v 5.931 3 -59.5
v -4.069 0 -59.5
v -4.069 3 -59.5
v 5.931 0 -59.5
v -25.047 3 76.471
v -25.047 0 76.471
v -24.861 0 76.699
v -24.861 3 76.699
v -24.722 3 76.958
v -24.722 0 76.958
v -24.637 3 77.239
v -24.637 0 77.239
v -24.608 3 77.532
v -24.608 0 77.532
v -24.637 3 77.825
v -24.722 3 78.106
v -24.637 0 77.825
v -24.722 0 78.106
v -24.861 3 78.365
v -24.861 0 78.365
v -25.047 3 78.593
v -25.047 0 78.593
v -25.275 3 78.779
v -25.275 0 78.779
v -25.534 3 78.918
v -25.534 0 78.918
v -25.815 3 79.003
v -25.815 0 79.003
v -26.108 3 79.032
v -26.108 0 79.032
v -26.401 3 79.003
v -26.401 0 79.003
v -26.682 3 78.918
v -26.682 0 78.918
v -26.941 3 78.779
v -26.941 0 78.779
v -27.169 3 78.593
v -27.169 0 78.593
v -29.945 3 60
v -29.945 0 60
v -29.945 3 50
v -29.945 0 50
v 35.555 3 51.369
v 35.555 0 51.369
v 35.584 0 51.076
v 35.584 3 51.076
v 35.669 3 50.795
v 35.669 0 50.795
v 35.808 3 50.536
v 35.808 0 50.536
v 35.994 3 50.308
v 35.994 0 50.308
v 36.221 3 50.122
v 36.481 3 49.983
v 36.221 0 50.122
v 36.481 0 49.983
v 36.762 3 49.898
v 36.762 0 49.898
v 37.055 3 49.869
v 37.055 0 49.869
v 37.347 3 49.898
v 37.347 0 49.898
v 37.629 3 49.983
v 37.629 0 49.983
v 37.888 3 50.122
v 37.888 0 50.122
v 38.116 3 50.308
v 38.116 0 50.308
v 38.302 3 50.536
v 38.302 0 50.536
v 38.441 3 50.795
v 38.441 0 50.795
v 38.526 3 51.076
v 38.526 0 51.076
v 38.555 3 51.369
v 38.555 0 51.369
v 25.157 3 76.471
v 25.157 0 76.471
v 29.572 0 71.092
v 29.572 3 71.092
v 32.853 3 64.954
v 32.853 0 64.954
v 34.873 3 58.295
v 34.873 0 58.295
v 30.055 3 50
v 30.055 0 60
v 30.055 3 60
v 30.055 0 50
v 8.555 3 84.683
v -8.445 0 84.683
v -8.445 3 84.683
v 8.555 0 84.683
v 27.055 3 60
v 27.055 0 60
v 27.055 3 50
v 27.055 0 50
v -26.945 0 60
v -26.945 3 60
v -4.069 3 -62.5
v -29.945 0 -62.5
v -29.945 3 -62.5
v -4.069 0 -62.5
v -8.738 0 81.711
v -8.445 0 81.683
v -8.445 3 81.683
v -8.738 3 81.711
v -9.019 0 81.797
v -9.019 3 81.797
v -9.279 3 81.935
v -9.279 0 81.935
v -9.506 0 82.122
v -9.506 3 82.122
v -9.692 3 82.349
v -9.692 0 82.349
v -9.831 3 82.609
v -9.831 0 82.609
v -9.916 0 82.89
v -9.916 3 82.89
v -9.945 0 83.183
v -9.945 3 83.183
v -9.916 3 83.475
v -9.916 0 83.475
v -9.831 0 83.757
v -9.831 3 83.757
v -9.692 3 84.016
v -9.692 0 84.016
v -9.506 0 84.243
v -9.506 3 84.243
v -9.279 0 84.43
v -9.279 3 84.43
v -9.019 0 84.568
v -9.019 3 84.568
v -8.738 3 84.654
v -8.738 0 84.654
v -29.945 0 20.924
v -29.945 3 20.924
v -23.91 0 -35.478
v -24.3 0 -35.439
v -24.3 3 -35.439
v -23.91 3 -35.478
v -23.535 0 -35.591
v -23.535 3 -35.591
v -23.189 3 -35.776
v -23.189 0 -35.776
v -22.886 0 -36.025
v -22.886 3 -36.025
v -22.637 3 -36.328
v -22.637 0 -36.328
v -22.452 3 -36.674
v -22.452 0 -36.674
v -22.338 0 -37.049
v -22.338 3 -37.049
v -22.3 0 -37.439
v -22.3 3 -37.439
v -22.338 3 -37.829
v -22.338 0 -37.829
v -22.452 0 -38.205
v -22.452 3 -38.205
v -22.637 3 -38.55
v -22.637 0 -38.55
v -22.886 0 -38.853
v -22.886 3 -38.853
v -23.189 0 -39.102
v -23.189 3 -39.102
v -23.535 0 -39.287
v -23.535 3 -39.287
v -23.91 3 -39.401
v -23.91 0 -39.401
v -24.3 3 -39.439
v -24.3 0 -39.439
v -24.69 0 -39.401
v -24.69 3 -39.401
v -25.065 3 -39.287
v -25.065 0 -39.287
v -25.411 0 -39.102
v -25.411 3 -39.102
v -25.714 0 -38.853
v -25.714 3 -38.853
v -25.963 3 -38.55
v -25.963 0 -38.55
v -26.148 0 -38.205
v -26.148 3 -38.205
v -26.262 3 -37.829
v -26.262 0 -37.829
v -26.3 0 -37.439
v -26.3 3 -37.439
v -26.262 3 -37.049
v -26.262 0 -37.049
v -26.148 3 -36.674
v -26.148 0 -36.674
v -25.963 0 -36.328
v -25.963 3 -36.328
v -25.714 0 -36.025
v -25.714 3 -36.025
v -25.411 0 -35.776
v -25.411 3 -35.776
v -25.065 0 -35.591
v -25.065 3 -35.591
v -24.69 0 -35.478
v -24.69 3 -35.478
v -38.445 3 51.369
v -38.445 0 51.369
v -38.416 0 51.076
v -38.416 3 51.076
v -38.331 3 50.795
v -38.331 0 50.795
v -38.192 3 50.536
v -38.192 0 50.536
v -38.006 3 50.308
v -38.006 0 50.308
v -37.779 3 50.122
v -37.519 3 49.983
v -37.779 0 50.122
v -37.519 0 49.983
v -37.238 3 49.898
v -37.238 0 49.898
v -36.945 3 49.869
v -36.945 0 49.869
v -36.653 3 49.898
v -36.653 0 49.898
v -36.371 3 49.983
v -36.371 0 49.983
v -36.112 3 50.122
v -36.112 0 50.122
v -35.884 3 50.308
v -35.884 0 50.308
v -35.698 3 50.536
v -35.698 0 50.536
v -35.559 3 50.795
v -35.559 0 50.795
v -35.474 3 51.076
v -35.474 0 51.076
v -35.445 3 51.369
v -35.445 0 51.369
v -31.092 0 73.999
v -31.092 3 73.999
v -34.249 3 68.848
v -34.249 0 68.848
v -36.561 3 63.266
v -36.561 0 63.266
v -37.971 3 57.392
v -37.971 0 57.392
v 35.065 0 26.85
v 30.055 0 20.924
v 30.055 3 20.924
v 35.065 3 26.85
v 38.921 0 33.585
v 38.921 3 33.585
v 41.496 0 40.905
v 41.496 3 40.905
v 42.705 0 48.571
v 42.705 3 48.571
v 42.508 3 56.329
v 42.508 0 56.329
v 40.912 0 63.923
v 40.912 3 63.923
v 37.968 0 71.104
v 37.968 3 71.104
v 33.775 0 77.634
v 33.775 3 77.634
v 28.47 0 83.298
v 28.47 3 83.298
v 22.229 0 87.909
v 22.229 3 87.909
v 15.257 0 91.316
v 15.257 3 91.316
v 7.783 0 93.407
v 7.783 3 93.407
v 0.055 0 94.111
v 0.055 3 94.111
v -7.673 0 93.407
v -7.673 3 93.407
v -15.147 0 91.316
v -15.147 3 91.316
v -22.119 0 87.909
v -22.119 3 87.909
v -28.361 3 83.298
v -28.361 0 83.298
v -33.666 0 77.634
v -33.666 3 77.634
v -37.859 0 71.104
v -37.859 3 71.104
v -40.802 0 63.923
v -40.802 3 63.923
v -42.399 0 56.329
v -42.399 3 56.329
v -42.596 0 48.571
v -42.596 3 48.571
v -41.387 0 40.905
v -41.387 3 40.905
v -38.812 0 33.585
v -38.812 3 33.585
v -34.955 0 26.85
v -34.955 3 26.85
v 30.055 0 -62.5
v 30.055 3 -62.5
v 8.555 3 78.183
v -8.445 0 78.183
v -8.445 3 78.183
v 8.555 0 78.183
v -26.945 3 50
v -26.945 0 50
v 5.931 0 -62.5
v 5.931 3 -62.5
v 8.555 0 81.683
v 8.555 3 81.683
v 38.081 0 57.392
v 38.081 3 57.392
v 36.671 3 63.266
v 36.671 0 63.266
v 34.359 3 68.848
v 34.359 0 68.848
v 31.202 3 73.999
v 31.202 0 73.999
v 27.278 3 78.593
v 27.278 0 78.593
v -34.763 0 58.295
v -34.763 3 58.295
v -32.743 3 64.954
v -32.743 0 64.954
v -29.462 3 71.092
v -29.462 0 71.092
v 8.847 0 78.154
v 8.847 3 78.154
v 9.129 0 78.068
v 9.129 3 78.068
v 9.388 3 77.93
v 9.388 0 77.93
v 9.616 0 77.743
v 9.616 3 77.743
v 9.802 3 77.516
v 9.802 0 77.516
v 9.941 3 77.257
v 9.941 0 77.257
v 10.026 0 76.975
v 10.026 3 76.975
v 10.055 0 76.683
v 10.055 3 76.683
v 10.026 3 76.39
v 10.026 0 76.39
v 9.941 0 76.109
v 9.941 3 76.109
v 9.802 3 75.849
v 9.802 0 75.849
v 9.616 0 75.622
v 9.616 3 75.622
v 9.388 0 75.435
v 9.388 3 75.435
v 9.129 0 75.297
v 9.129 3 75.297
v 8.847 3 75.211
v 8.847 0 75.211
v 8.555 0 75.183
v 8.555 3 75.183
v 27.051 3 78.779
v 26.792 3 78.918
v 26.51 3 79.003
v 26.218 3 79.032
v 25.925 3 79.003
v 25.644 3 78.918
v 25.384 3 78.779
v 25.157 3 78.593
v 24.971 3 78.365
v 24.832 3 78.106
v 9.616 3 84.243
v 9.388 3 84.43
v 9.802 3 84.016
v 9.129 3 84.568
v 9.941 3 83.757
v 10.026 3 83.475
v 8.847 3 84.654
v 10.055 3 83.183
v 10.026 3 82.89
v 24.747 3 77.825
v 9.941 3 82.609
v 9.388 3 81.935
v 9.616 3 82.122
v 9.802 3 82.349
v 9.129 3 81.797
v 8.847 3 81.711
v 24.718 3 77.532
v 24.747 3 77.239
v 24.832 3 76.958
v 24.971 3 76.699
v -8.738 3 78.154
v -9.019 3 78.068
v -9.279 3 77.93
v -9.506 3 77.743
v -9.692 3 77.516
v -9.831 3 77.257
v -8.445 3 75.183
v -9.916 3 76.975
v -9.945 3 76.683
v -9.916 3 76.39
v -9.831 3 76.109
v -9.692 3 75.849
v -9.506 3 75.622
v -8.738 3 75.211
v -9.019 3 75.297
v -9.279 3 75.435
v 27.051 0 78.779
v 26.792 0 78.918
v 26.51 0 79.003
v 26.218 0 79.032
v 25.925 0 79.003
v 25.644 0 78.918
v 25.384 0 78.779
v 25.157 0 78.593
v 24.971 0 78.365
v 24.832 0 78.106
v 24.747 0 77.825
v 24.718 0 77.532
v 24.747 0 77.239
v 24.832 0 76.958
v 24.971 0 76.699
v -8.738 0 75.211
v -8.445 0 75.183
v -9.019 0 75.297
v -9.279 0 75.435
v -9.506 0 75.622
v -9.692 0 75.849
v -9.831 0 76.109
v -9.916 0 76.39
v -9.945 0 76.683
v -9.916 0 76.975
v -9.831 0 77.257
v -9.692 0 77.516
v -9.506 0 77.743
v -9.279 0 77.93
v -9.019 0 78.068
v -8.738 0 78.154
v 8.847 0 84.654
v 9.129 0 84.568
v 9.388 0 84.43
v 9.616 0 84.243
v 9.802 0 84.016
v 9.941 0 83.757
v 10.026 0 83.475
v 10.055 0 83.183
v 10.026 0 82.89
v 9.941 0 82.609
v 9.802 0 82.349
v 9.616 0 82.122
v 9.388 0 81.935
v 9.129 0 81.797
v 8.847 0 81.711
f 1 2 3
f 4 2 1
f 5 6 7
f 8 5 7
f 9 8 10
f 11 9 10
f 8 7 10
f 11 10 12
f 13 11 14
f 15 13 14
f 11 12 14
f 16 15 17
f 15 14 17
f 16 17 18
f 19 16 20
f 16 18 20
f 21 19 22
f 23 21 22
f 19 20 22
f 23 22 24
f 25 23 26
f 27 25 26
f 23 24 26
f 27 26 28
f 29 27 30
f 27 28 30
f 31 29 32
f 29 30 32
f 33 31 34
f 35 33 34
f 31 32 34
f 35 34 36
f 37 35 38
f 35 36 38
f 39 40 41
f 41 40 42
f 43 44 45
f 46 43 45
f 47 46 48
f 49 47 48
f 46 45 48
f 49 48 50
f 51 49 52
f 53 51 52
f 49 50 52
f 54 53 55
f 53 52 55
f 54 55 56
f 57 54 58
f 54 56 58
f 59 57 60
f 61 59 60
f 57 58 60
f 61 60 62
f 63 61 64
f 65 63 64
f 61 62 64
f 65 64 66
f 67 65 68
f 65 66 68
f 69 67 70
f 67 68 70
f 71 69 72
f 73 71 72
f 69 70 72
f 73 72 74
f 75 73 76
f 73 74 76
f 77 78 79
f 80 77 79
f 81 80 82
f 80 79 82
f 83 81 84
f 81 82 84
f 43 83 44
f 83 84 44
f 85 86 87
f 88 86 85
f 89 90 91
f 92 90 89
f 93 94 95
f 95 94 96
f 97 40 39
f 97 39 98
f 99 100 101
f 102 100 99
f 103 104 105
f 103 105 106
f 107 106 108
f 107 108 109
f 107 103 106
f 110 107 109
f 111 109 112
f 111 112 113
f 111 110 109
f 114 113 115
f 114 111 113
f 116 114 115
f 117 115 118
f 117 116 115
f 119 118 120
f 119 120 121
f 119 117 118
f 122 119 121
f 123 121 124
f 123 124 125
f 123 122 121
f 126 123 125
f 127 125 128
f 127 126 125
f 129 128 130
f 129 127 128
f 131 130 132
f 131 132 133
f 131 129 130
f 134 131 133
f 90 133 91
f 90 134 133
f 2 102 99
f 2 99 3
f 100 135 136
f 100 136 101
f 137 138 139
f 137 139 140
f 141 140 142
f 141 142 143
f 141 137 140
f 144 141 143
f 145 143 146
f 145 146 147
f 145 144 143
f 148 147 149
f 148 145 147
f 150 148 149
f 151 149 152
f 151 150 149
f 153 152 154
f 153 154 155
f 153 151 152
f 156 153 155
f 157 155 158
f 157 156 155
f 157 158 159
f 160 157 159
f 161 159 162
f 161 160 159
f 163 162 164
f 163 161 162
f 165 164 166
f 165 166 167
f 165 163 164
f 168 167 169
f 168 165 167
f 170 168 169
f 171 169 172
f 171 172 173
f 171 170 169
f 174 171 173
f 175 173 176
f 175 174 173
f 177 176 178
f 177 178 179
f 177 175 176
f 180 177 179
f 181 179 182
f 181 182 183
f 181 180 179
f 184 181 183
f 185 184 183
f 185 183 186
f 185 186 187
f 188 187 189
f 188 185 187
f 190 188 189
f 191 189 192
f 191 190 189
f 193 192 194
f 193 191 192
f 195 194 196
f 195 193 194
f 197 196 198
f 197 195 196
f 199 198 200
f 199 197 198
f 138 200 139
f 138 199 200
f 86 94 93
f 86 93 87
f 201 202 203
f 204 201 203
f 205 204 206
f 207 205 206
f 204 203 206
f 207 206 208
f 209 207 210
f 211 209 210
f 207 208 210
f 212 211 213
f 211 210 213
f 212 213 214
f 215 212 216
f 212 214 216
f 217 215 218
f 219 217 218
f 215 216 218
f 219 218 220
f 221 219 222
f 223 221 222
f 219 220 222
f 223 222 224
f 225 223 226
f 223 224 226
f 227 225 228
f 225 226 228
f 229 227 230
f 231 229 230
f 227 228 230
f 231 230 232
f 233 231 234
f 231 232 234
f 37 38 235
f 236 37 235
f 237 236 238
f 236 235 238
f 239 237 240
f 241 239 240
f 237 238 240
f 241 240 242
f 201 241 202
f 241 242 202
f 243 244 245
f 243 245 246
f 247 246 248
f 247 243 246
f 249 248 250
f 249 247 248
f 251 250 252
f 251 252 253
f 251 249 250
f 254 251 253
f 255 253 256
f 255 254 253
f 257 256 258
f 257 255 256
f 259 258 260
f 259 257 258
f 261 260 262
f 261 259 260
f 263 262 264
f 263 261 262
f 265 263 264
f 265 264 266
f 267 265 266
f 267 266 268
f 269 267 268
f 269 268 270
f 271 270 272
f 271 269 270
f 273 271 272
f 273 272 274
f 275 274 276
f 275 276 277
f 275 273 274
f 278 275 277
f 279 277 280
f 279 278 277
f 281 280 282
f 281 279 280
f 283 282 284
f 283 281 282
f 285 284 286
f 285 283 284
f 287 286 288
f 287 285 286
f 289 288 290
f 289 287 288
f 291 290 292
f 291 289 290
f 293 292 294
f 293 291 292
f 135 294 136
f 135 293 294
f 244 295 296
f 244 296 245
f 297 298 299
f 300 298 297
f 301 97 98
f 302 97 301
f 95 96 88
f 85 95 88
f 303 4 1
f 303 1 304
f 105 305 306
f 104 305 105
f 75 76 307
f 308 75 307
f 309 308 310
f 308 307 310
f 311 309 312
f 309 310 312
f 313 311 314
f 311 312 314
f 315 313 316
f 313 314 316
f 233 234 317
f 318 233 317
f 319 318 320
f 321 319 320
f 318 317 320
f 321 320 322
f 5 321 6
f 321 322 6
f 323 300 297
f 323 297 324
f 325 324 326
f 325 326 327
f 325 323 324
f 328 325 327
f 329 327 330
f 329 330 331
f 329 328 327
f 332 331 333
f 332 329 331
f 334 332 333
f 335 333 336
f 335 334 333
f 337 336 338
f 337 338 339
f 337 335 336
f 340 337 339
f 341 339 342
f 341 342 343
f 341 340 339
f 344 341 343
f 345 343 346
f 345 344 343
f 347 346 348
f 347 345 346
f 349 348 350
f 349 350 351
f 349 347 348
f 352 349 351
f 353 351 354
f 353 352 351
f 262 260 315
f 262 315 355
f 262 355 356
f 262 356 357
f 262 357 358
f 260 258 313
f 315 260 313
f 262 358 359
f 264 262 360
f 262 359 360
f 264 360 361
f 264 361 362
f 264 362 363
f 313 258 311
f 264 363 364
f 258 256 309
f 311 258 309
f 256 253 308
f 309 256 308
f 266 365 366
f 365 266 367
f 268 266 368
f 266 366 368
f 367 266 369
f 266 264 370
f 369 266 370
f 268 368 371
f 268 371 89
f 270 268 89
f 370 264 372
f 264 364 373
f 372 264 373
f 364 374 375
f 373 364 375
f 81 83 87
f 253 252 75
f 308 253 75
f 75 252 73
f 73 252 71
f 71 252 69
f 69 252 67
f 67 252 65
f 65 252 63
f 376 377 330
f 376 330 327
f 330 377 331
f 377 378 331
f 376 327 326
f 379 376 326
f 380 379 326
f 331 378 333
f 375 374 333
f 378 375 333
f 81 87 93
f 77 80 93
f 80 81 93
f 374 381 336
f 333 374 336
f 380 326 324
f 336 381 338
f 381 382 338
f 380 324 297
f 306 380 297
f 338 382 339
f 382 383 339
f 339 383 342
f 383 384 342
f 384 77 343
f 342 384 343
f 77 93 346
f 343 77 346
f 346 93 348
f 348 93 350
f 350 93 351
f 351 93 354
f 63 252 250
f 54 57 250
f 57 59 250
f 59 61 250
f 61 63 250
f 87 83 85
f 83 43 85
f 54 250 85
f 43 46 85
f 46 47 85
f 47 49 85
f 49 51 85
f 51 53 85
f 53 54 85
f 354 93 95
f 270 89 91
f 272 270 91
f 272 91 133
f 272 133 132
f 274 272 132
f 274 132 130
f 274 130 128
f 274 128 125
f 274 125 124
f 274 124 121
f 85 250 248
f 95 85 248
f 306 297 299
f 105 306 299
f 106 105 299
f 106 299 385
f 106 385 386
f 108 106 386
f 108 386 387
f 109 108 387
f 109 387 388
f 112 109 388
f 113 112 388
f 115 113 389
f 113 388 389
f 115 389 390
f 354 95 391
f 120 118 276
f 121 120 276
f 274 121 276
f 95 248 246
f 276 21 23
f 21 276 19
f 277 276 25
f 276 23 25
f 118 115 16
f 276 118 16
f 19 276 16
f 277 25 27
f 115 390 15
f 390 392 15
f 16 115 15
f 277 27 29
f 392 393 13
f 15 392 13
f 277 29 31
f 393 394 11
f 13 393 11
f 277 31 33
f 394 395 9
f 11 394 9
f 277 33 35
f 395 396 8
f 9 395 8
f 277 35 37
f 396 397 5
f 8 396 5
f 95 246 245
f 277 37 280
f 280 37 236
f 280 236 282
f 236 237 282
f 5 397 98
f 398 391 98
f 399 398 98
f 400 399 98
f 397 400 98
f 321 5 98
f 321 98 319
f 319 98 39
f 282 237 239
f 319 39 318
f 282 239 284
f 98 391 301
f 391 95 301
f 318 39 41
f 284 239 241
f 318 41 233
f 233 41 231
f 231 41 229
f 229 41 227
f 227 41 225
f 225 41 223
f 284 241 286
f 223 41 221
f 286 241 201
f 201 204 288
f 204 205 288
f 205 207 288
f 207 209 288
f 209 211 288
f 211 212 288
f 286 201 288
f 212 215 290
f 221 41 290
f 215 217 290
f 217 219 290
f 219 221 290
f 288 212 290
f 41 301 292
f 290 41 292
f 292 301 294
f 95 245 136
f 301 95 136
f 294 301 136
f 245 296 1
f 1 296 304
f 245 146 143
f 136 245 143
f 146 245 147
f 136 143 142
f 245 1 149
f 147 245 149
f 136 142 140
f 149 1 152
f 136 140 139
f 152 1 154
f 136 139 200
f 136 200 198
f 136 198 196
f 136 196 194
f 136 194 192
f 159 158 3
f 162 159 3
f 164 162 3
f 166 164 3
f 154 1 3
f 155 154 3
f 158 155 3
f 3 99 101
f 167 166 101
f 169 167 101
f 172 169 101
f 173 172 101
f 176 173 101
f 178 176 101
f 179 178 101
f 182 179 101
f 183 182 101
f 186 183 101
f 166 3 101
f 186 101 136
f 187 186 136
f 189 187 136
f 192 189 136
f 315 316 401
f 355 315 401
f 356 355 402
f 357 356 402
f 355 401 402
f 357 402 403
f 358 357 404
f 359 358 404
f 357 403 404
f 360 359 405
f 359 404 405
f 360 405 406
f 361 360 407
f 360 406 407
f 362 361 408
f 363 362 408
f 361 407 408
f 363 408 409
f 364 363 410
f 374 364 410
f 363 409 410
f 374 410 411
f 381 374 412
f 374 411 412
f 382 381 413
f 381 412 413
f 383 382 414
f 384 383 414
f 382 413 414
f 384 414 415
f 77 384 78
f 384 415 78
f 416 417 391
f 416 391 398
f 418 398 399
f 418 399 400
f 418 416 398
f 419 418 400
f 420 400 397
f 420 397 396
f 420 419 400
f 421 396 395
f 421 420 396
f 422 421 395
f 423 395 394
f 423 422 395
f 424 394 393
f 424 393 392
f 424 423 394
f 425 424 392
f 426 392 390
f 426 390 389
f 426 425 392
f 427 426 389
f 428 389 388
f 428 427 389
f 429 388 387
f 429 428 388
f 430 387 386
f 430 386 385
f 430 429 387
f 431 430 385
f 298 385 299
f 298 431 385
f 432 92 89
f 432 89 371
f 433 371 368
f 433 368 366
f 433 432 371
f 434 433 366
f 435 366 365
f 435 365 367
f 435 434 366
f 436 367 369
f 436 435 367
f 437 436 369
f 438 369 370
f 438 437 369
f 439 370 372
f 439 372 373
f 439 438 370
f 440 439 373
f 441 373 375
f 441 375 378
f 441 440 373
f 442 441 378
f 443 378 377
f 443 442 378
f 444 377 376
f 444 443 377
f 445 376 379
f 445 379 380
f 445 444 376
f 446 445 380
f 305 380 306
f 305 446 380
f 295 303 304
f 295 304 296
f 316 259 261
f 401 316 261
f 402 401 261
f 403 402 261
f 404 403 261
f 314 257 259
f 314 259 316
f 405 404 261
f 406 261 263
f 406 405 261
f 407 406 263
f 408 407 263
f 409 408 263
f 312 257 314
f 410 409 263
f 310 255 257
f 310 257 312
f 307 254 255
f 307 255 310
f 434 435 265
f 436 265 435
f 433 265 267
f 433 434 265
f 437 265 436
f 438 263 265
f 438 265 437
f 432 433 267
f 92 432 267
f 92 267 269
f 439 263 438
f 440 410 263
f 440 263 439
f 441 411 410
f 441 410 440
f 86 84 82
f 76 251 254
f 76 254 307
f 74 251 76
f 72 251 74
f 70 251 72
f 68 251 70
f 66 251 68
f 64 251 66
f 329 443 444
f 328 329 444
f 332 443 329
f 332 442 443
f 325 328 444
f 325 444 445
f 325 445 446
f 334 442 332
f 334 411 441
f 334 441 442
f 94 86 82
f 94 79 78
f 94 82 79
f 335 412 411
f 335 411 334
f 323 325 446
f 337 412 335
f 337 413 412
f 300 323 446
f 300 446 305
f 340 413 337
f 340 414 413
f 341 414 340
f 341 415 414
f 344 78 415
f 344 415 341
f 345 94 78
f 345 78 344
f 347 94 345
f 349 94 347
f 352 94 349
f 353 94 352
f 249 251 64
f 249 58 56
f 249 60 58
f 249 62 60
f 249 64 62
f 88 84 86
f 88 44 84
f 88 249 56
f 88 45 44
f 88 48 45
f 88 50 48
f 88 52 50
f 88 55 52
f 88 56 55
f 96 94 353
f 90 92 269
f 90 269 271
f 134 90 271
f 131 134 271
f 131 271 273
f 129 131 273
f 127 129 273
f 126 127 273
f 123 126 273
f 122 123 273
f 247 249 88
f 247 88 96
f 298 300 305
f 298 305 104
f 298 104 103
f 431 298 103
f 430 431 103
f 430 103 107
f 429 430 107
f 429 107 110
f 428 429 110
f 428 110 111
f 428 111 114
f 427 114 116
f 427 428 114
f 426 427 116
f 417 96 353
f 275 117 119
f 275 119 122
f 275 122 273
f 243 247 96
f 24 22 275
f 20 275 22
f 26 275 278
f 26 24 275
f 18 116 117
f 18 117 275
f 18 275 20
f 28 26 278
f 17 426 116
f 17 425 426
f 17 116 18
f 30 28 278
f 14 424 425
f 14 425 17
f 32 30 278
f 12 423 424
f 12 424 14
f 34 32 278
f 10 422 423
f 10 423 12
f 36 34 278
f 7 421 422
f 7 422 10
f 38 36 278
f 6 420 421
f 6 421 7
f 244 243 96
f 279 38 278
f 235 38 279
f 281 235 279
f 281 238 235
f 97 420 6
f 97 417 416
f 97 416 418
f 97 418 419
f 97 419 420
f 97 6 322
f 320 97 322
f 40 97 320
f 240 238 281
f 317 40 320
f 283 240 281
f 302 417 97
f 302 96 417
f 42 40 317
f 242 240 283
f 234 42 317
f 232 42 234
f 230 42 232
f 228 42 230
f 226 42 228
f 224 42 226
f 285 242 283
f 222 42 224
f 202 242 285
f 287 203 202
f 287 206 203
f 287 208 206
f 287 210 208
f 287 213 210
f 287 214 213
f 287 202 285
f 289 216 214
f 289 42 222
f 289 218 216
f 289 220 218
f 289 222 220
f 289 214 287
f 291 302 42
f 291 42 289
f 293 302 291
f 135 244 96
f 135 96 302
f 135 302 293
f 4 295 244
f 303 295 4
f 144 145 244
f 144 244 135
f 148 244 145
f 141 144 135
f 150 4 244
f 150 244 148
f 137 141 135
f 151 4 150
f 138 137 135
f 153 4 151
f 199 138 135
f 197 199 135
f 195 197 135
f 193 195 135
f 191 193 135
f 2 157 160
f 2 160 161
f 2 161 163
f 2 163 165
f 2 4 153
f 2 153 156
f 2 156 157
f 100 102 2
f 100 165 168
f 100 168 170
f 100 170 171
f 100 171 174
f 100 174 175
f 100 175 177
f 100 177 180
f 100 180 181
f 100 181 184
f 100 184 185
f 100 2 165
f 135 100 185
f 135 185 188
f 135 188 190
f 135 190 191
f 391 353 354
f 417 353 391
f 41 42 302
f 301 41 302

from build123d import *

# Parameters (mm, degrees)
CROQUIS1_R              = 2
CROQUIS1_W              = 3
CROQUIS1_H              = 10
SALIENTE_EXTRUIR1_DEPTH = 3


with BuildPart() as part:
    # Croquis1 → Saliente-Extruir1 (new body)
    with BuildSketch(Plane(origin=(0, 0, 0), x_dir=(1, 0, 0), z_dir=(0, 1, 0))):
        with BuildLine():
            Line((-29.945152174, -20.924198867), (-29.945152174, 62.5))
            Line((-29.945152174, 62.5), (-4.069135421, 62.5))
            Line((-4.069135421, 62.5), (-4.069135421, 59.5))
            Line((-4.069135421, 59.5), (5.930864579, 59.5))
            Line((5.930864579, 59.5), (5.930864579, 62.5))
            Line((5.930864579, 62.5), (30.054847826, 62.5))
            Line((30.054847826, 62.5), (30.054847826, -20.924198867))
            ThreePointArc((30.054847826, -20.924198867), (0.054847826, -94.111194706), (-29.945152174, -20.924198867))
        make_face()
        with Locations(Location((-24.3, 37.439181633, 0), (0, 0, 270))):
            Circle(CROQUIS1_R, mode=Mode.SUBTRACT)
        with Locations((28.554847826, -55)):
            Rectangle(CROQUIS1_W, CROQUIS1_H, mode=Mode.SUBTRACT)
        with Locations((-28.445152174, -55)):
            Rectangle(CROQUIS1_W, CROQUIS1_H, mode=Mode.SUBTRACT)
        with BuildLine():
            Line((8.554847826, -75.182623358), (-8.445152174, -75.182623358))
            ThreePointArc((-8.445152174, -75.182623358), (-9.945152174, -76.682623358), (-8.445152174, -78.182623358))
            Line((-8.445152174, -78.182623358), (8.554847826, -78.182623358))
            ThreePointArc((8.554847826, -78.182623358), (10.054847826, -76.682623358), (8.554847826, -75.182623358))
        make_face(mode=Mode.SUBTRACT)
        with BuildLine():
            Line((8.554847826, -81.682623358), (-8.445152174, -81.682623358))
            ThreePointArc((-8.445152174, -81.682623358), (-9.945152174, -83.182623358), (-8.445152174, -84.682623358))
            Line((-8.445152174, -84.682623358), (8.554847826, -84.682623358))
            ThreePointArc((8.554847826, -84.682623358), (10.054847826, -83.182623358), (8.554847826, -81.682623358))
        make_face(mode=Mode.SUBTRACT)
        with BuildLine():
            ThreePointArc((25.157138558, -76.471354215), (32.85257123, -64.954325332), (35.554847826, -51.369063483))
            ThreePointArc((35.554847826, -51.369063483), (37.054847826, -49.869063483), (38.554847826, -51.369063483))
            ThreePointArc((38.554847826, -51.369063483), (35.624209827, -66.102375629), (27.278458901, -78.592674559))
            ThreePointArc((27.278458901, -78.592674559), (25.157138558, -78.592674559), (25.157138558, -76.471354215))
        make_face(mode=Mode.SUBTRACT)
        with BuildLine():
            ThreePointArc((-35.445152174, -51.369063483), (-32.742875579, -64.954325332), (-25.047442907, -76.471354215))
            ThreePointArc((-25.047442907, -76.471354215), (-25.047442907, -78.592674559), (-27.16876325, -78.592674559))
            ThreePointArc((-27.16876325, -78.592674559), (-35.514514176, -66.102375629), (-38.445152174, -51.369063483))
            ThreePointArc((-38.445152174, -51.369063483), (-36.945152174, -49.869063483), (-35.445152174, -51.369063483))
        make_face(mode=Mode.SUBTRACT)
    extrude(amount=SALIENTE_EXTRUIR1_DEPTH)


solid = part.part
